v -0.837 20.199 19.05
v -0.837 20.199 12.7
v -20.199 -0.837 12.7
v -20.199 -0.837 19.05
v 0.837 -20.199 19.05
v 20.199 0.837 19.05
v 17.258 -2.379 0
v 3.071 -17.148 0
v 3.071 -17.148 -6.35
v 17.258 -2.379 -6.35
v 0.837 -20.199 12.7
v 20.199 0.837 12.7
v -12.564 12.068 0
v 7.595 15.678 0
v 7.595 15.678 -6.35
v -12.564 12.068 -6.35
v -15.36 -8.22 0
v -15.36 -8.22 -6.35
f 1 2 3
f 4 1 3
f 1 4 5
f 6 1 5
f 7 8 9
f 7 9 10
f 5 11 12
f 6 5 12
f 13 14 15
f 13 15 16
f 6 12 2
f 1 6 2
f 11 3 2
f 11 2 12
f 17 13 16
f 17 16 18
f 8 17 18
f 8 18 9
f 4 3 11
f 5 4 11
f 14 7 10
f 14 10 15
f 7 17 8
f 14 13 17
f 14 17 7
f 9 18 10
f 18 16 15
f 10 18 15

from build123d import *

# Parameters (mm, degrees)
F2_DEPTH = 6.35
F4_DEPTH = 6.35


with BuildPart() as f2:
    # F1 (on Top) → F2 (new body)
    with BuildSketch(Plane.XY):
        Polygon((17.257783, -2.378632), (7.595161, 15.678089), (-12.563715, 12.068224), (-15.359964, -8.219517), (3.070735, -17.148165), align=None)
    extrude(amount=-F2_DEPTH)


with BuildPart() as f4:
    # F3 (on offset) → F4 (new body)
    with BuildSketch(Plane.XY.offset(12.7)):
        Polygon((20.199441, 0.837124), (-0.837124, 20.199441), (-20.199441, -0.837124), (0.837124, -20.199441), align=None)
    extrude(amount=F4_DEPTH)


solid = Compound([f2.part, f4.part])
